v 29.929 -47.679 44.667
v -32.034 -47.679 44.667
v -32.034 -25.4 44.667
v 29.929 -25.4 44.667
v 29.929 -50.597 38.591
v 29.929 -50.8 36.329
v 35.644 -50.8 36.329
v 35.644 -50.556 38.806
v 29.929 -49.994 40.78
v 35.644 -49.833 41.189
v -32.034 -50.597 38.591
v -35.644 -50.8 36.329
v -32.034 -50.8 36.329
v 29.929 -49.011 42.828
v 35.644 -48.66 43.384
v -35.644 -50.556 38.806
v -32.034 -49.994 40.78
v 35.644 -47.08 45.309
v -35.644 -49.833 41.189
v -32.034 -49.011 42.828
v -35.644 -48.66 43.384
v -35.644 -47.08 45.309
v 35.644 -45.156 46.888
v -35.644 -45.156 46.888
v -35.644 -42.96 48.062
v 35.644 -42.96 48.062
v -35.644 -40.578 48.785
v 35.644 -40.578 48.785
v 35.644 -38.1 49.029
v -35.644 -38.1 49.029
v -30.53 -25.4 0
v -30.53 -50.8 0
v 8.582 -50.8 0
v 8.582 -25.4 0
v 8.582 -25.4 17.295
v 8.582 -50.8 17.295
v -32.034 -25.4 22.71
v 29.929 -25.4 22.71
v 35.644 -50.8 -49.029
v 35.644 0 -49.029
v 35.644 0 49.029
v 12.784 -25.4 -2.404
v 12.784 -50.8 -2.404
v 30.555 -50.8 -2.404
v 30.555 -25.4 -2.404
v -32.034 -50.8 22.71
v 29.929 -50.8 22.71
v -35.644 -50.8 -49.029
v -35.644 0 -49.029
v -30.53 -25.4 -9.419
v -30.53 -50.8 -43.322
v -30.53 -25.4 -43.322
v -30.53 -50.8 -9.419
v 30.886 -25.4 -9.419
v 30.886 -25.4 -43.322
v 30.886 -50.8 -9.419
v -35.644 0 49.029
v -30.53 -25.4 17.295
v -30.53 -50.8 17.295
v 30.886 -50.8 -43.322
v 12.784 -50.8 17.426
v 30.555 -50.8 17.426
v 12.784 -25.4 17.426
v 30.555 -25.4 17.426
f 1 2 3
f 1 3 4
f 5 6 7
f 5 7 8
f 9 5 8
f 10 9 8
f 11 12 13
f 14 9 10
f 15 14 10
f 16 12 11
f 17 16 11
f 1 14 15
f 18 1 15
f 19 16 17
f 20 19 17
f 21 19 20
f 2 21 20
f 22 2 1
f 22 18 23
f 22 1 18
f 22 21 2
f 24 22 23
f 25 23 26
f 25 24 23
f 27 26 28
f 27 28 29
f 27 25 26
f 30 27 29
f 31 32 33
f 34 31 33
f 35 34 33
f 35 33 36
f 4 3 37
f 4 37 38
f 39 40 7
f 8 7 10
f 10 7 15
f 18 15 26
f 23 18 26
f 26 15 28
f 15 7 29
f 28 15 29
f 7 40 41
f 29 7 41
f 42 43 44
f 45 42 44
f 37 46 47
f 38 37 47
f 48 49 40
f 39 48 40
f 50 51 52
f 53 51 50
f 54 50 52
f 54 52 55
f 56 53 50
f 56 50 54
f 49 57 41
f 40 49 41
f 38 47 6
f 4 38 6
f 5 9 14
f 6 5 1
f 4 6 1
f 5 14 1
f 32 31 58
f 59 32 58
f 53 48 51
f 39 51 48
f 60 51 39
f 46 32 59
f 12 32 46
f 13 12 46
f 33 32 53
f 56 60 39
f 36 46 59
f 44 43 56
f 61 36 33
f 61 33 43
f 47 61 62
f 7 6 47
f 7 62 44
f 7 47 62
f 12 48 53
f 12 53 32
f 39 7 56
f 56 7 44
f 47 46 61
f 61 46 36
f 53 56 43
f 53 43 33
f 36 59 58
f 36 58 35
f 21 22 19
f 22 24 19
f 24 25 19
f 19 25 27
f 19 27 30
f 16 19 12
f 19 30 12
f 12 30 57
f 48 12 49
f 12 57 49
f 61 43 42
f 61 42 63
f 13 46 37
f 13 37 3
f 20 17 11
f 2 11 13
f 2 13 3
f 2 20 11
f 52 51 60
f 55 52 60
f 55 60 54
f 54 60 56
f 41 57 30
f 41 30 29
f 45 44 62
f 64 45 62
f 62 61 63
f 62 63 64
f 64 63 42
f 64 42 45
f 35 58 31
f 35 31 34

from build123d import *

# Parameters (mm, degrees)
F0_W        = 71.2871104479
F0_H        = 49.0286853164
F0_W_2      = 58.531470614
F0_H_2      = 36.0211754636
F0_W_3      = 60.9135755652
F0_H_3      = 33.0608540971
F1_DEPTH    = 50.8
F2_W        = 39.112127386
F2_H        = 17.2953940928
F2_W_2      = 17.7711145952
F2_H_2      = 19.8306103703
F2_W_3      = 61.416560784
F2_H_3      = 33.9031042531
F2_W_4      = 61.9626361877
F2_H_4      = 21.9576358795
F3_DEPTH    = 25.4
F4_T1_DEPTH = 134.7871104479


# Not quite as in the source:
# - a fillet or chamfer that OpenCascade refuses, or shapes differently, is made with other operations: its cross-section is extruded or revolved along the edge and cut away or added


with BuildPart() as f1:
    # F0 (on Front) → F1 (new body)
    with BuildSketch(Plane.XZ):
        with Locations((0, 24.5143426582)):
            Rectangle(F0_W, F0_H)
        with Locations((-0.6145685997, 23.0905877318)):
            Rectangle(F0_W_2, F0_H_2, mode=Mode.SUBTRACT)
        with Locations((0, -24.5143426582)):
            Rectangle(F0_W, F0_H)
        with Locations((0.2925068763, -25.7660689676)):
            Rectangle(F0_W_3, F0_H_3, mode=Mode.SUBTRACT)
        with Locations((-0.6145685997, 23.0905877318)):
            Rectangle(F0_W_2, F0_H_2)
        with Locations((0.2925068763, -25.7660689676)):
            Rectangle(F0_W_3, F0_H_3)
    extrude(amount=F1_DEPTH)

    # F2 (on face) → F3 (cut)
    with BuildSketch(Plane.XZ.offset(50.8)):
        with Locations((-10.9740667976, 8.6476970464)):
            Rectangle(F2_W, F2_H)
        with Locations((21.669532638, 7.5109825702)):
            Rectangle(F2_W_2, F2_H_2)
        with Locations((0.1781499013, -26.3703963719)):
            Rectangle(F2_W_3, F2_H_3)
        with Locations((-1.0527623817, 33.6884222925)):
            Rectangle(F2_W_4, F2_H_4)
    extrude(amount=-F3_DEPTH, mode=Mode.SUBTRACT)

    # F4: fillet of radius 12.7 on 1 edges, made by hand

    # F4_s2 → F4_t1 (cut)
    with BuildSketch(Plane.YZ.offset(-67.3935552239)):
        with BuildLine():
            ThreePointArc((-50.8, 36.3286853164), (-47.0802561211, 45.3089414375), (-38.1, 49.0286853164))
            Line((-38.1, 49.0286853164), (-50.8, 49.0286853164))
            Line((-50.8, 49.0286853164), (-50.8, 36.3286853164))
        make_face()
    extrude(amount=F4_T1_DEPTH, mode=Mode.SUBTRACT)


solid = f1.part
